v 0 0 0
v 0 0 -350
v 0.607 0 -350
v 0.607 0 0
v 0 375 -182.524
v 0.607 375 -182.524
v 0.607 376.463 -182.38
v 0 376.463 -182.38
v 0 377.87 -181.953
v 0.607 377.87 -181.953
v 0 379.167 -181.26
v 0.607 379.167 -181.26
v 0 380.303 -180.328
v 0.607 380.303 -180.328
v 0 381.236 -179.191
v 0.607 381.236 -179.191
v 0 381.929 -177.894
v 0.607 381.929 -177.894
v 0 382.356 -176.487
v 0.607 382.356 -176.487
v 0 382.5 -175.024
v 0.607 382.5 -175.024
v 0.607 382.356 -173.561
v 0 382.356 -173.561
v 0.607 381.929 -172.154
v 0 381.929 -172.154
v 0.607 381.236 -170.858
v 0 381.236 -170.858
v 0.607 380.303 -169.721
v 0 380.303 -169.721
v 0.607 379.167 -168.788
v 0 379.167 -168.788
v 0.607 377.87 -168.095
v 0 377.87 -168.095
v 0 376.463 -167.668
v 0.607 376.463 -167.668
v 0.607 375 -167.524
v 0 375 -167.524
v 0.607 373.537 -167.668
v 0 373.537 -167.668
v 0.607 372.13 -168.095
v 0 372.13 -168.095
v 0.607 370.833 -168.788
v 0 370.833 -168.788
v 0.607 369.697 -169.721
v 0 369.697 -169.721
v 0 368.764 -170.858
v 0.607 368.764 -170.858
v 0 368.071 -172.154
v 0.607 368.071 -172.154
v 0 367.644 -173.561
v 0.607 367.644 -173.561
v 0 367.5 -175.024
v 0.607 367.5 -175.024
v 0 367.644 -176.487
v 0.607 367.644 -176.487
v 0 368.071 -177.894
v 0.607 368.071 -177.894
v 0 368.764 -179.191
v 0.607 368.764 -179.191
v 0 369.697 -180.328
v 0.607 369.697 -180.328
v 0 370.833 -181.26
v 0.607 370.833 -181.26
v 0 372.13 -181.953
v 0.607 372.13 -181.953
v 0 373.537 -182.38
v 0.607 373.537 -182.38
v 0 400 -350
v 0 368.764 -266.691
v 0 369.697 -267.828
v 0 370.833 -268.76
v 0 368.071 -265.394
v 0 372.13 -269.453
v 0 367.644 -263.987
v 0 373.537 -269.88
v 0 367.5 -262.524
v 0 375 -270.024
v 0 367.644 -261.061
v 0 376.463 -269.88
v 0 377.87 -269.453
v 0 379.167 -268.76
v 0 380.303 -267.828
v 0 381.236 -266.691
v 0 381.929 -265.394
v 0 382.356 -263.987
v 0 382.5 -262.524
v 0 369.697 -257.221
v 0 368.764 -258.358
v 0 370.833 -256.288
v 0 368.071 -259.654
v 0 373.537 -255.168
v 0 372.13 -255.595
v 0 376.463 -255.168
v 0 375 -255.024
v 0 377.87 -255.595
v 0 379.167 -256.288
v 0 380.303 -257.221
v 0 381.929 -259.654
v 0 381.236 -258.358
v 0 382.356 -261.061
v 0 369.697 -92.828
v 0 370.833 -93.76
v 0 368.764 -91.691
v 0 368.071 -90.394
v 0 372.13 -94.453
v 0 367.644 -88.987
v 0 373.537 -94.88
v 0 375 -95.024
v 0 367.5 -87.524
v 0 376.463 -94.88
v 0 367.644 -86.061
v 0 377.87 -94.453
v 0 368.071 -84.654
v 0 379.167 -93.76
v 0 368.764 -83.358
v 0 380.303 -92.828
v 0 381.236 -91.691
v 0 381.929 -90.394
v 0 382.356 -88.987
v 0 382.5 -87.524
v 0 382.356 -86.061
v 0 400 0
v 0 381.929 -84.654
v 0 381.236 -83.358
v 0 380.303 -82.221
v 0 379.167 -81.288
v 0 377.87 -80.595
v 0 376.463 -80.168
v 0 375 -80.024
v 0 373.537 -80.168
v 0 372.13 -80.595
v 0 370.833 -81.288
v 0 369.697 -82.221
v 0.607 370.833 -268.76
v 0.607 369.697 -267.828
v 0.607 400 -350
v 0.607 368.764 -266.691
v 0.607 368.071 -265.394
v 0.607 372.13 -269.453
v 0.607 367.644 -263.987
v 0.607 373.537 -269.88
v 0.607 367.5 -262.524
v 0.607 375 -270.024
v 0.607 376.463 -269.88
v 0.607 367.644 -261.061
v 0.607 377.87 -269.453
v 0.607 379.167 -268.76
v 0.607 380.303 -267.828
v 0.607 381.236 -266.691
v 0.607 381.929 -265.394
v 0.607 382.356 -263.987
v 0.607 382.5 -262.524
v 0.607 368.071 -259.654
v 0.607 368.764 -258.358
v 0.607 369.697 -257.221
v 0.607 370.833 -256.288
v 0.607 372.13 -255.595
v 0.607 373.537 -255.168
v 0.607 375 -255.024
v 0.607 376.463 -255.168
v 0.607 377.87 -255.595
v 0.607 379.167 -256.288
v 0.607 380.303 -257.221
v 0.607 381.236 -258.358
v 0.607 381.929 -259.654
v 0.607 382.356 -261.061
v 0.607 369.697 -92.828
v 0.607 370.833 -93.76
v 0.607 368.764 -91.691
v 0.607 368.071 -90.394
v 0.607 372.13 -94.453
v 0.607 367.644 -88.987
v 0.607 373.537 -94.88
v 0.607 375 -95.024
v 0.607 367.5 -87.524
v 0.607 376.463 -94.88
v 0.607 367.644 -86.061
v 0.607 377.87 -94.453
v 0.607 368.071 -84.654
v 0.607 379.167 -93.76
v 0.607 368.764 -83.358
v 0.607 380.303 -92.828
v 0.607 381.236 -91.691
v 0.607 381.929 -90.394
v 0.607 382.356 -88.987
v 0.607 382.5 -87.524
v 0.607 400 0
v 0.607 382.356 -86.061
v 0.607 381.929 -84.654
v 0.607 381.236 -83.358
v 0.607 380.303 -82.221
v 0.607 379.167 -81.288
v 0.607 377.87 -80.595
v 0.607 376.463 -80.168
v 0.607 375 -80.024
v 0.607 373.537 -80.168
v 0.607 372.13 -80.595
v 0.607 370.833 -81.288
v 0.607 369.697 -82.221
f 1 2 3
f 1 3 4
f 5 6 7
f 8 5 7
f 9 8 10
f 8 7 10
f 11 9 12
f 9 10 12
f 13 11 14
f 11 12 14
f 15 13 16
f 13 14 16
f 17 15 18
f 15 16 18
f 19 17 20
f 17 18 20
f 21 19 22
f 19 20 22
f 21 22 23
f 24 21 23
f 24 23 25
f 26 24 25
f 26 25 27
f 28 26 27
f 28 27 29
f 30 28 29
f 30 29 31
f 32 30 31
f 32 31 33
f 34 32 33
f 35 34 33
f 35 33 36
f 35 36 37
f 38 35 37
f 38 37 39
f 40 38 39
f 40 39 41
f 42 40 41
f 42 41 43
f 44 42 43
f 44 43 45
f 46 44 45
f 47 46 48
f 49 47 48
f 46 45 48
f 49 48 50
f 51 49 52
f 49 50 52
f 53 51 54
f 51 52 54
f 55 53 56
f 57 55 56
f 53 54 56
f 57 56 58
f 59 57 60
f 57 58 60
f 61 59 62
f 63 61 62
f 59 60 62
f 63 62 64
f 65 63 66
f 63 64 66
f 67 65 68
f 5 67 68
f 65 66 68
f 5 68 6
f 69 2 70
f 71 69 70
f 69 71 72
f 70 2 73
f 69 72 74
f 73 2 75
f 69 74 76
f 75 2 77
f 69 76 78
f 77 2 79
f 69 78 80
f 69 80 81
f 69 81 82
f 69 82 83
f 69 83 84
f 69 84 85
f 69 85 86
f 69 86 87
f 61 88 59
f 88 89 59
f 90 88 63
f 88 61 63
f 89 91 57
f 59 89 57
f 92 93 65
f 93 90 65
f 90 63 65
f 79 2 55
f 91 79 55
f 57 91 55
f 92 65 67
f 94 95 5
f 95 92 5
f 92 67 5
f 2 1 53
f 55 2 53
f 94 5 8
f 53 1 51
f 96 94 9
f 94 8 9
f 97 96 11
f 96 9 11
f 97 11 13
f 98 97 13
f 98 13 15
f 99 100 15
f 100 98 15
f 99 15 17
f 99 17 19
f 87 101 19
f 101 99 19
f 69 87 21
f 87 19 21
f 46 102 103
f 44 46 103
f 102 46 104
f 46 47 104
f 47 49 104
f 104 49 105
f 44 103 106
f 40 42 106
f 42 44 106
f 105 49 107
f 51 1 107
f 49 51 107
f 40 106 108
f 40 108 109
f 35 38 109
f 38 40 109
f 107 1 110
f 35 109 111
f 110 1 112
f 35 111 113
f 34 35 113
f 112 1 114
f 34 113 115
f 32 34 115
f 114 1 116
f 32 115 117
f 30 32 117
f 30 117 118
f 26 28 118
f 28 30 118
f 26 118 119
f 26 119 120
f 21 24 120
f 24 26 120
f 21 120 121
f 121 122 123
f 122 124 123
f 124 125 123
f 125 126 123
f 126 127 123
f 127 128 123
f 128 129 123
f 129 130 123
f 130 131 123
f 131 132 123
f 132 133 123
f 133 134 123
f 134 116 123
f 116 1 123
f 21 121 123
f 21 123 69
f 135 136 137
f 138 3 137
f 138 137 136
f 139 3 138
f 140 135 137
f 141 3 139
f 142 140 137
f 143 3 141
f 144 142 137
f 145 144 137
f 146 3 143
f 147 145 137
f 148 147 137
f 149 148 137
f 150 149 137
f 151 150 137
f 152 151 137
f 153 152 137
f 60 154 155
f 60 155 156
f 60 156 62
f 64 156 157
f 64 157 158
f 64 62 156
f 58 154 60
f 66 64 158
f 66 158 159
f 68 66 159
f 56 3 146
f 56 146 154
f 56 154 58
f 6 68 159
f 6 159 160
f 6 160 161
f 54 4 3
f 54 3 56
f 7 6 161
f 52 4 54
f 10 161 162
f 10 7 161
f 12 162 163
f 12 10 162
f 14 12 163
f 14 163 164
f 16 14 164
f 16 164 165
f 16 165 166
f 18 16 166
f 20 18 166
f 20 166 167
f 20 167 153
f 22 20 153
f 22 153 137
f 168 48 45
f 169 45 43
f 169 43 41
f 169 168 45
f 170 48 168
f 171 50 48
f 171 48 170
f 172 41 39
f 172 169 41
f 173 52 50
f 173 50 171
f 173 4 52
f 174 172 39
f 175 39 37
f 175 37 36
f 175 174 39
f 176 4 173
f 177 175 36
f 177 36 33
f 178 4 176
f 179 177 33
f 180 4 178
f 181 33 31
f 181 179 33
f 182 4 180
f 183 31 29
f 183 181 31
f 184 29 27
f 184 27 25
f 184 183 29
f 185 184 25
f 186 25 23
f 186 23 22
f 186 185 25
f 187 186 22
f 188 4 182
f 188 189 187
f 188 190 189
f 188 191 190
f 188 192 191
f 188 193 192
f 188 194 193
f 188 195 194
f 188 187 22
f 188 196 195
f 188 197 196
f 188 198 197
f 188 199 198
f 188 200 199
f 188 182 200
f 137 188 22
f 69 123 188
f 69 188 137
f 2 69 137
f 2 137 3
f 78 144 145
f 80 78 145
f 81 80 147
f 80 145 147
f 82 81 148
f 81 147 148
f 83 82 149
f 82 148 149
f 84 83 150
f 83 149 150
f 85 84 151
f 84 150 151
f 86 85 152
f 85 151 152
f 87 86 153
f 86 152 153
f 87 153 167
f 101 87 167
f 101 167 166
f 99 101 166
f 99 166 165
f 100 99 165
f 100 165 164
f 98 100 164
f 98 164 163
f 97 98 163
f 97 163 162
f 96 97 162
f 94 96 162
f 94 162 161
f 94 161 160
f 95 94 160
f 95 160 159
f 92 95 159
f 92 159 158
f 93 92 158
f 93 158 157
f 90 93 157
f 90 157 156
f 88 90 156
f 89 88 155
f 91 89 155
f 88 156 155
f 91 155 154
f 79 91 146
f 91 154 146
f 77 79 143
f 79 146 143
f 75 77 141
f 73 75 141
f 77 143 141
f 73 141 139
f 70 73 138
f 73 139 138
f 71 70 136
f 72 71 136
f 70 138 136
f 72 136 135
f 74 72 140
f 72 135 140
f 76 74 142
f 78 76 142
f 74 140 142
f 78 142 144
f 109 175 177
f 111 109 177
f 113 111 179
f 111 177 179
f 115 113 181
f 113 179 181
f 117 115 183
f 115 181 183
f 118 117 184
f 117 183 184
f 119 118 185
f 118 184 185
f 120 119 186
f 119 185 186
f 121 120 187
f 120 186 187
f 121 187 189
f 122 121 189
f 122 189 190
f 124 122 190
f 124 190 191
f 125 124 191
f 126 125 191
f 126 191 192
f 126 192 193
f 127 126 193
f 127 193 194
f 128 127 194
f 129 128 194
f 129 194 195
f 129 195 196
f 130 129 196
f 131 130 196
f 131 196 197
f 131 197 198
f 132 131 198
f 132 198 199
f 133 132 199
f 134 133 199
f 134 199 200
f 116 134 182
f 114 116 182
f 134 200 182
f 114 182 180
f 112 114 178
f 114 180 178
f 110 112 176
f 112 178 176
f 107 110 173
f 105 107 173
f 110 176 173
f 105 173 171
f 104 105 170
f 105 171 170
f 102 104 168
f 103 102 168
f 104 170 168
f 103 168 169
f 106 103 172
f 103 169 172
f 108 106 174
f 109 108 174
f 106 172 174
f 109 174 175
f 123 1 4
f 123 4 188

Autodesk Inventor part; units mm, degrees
ref_plane "YZ Plane" through (0, 0, 0) normal (1, 0, 0) x (0, 1, 0)
ref_plane "XZ Plane" through (0, 0, 0) normal (0, 1, 0) x (-1, 0, 0)
ref_plane "XY Plane" through (0, 0, 0) normal (0, 0, 1) x (1, 0, 0)
sketch "Sketch1" plane through (0, 0, 0) normal (1, 0, 0) x (0, 1, 0)
  line L0 (0, 0) -> (400, 0)
  line L1 (400, 0) -> (400, -350)
  line L2 (400, -350) -> (0, -350)
  line L3 (0, -350) -> (0, 0)
  dimension "d0" = 400
  dimension "d1" = 350
extrude "Extrusion1" add sketch "Sketch1" along normal blind 0.607
sketch "Sketch2" plane through (0.607, 0, 0) normal (1, 0, 0) x (0, 0, -1)
  line L0 (0, 399.8291) -> (174.9999, 400)
  line L1 (350, 400) -> (0, 400) projected
  line L2 (174.9999, 400) -> (175.0243, 375)
  circle A0 centre (175.0243, 375) radius 7.5
  line L3 (175.0243, 375) -> (87.5243, 375)
  line L4 (175.0243, 375) -> (262.5243, 375)
  circle A1 centre (87.5243, 375) radius 7.5
  circle A2 centre (262.5243, 375) radius 7.5
  point P0 (0, 0)
  dimension "d4" = 175
  dimension "d5" = 25
  dimension "d7" = 15
  dimension "d12" = 15
  dimension "d13" = 15
extrude "Extrusion2" cut sketch "Sketch2" against normal through all
equation "\"BendRadius\" = Thickness"
equation "\"BendReliefWidth\" = Thickness"
equation "\"BendReliefDepth\" = 0.5 * Thickness"
equation "\"CornerReliefSize\" = 4 * Thickness"
equation "\"MinimumRemnant\" = 2 * Thickness"
equation "\"TransitionRadius\" = BendRadius"
equation "\"JacobiRadiusSize\" = BendRadius"
equation "\"GapSize\" = Thickness"
equation "\"Thickness\" = 0.607"
properties part number "project Backrestfinal" material "Steel, Galvanized"
